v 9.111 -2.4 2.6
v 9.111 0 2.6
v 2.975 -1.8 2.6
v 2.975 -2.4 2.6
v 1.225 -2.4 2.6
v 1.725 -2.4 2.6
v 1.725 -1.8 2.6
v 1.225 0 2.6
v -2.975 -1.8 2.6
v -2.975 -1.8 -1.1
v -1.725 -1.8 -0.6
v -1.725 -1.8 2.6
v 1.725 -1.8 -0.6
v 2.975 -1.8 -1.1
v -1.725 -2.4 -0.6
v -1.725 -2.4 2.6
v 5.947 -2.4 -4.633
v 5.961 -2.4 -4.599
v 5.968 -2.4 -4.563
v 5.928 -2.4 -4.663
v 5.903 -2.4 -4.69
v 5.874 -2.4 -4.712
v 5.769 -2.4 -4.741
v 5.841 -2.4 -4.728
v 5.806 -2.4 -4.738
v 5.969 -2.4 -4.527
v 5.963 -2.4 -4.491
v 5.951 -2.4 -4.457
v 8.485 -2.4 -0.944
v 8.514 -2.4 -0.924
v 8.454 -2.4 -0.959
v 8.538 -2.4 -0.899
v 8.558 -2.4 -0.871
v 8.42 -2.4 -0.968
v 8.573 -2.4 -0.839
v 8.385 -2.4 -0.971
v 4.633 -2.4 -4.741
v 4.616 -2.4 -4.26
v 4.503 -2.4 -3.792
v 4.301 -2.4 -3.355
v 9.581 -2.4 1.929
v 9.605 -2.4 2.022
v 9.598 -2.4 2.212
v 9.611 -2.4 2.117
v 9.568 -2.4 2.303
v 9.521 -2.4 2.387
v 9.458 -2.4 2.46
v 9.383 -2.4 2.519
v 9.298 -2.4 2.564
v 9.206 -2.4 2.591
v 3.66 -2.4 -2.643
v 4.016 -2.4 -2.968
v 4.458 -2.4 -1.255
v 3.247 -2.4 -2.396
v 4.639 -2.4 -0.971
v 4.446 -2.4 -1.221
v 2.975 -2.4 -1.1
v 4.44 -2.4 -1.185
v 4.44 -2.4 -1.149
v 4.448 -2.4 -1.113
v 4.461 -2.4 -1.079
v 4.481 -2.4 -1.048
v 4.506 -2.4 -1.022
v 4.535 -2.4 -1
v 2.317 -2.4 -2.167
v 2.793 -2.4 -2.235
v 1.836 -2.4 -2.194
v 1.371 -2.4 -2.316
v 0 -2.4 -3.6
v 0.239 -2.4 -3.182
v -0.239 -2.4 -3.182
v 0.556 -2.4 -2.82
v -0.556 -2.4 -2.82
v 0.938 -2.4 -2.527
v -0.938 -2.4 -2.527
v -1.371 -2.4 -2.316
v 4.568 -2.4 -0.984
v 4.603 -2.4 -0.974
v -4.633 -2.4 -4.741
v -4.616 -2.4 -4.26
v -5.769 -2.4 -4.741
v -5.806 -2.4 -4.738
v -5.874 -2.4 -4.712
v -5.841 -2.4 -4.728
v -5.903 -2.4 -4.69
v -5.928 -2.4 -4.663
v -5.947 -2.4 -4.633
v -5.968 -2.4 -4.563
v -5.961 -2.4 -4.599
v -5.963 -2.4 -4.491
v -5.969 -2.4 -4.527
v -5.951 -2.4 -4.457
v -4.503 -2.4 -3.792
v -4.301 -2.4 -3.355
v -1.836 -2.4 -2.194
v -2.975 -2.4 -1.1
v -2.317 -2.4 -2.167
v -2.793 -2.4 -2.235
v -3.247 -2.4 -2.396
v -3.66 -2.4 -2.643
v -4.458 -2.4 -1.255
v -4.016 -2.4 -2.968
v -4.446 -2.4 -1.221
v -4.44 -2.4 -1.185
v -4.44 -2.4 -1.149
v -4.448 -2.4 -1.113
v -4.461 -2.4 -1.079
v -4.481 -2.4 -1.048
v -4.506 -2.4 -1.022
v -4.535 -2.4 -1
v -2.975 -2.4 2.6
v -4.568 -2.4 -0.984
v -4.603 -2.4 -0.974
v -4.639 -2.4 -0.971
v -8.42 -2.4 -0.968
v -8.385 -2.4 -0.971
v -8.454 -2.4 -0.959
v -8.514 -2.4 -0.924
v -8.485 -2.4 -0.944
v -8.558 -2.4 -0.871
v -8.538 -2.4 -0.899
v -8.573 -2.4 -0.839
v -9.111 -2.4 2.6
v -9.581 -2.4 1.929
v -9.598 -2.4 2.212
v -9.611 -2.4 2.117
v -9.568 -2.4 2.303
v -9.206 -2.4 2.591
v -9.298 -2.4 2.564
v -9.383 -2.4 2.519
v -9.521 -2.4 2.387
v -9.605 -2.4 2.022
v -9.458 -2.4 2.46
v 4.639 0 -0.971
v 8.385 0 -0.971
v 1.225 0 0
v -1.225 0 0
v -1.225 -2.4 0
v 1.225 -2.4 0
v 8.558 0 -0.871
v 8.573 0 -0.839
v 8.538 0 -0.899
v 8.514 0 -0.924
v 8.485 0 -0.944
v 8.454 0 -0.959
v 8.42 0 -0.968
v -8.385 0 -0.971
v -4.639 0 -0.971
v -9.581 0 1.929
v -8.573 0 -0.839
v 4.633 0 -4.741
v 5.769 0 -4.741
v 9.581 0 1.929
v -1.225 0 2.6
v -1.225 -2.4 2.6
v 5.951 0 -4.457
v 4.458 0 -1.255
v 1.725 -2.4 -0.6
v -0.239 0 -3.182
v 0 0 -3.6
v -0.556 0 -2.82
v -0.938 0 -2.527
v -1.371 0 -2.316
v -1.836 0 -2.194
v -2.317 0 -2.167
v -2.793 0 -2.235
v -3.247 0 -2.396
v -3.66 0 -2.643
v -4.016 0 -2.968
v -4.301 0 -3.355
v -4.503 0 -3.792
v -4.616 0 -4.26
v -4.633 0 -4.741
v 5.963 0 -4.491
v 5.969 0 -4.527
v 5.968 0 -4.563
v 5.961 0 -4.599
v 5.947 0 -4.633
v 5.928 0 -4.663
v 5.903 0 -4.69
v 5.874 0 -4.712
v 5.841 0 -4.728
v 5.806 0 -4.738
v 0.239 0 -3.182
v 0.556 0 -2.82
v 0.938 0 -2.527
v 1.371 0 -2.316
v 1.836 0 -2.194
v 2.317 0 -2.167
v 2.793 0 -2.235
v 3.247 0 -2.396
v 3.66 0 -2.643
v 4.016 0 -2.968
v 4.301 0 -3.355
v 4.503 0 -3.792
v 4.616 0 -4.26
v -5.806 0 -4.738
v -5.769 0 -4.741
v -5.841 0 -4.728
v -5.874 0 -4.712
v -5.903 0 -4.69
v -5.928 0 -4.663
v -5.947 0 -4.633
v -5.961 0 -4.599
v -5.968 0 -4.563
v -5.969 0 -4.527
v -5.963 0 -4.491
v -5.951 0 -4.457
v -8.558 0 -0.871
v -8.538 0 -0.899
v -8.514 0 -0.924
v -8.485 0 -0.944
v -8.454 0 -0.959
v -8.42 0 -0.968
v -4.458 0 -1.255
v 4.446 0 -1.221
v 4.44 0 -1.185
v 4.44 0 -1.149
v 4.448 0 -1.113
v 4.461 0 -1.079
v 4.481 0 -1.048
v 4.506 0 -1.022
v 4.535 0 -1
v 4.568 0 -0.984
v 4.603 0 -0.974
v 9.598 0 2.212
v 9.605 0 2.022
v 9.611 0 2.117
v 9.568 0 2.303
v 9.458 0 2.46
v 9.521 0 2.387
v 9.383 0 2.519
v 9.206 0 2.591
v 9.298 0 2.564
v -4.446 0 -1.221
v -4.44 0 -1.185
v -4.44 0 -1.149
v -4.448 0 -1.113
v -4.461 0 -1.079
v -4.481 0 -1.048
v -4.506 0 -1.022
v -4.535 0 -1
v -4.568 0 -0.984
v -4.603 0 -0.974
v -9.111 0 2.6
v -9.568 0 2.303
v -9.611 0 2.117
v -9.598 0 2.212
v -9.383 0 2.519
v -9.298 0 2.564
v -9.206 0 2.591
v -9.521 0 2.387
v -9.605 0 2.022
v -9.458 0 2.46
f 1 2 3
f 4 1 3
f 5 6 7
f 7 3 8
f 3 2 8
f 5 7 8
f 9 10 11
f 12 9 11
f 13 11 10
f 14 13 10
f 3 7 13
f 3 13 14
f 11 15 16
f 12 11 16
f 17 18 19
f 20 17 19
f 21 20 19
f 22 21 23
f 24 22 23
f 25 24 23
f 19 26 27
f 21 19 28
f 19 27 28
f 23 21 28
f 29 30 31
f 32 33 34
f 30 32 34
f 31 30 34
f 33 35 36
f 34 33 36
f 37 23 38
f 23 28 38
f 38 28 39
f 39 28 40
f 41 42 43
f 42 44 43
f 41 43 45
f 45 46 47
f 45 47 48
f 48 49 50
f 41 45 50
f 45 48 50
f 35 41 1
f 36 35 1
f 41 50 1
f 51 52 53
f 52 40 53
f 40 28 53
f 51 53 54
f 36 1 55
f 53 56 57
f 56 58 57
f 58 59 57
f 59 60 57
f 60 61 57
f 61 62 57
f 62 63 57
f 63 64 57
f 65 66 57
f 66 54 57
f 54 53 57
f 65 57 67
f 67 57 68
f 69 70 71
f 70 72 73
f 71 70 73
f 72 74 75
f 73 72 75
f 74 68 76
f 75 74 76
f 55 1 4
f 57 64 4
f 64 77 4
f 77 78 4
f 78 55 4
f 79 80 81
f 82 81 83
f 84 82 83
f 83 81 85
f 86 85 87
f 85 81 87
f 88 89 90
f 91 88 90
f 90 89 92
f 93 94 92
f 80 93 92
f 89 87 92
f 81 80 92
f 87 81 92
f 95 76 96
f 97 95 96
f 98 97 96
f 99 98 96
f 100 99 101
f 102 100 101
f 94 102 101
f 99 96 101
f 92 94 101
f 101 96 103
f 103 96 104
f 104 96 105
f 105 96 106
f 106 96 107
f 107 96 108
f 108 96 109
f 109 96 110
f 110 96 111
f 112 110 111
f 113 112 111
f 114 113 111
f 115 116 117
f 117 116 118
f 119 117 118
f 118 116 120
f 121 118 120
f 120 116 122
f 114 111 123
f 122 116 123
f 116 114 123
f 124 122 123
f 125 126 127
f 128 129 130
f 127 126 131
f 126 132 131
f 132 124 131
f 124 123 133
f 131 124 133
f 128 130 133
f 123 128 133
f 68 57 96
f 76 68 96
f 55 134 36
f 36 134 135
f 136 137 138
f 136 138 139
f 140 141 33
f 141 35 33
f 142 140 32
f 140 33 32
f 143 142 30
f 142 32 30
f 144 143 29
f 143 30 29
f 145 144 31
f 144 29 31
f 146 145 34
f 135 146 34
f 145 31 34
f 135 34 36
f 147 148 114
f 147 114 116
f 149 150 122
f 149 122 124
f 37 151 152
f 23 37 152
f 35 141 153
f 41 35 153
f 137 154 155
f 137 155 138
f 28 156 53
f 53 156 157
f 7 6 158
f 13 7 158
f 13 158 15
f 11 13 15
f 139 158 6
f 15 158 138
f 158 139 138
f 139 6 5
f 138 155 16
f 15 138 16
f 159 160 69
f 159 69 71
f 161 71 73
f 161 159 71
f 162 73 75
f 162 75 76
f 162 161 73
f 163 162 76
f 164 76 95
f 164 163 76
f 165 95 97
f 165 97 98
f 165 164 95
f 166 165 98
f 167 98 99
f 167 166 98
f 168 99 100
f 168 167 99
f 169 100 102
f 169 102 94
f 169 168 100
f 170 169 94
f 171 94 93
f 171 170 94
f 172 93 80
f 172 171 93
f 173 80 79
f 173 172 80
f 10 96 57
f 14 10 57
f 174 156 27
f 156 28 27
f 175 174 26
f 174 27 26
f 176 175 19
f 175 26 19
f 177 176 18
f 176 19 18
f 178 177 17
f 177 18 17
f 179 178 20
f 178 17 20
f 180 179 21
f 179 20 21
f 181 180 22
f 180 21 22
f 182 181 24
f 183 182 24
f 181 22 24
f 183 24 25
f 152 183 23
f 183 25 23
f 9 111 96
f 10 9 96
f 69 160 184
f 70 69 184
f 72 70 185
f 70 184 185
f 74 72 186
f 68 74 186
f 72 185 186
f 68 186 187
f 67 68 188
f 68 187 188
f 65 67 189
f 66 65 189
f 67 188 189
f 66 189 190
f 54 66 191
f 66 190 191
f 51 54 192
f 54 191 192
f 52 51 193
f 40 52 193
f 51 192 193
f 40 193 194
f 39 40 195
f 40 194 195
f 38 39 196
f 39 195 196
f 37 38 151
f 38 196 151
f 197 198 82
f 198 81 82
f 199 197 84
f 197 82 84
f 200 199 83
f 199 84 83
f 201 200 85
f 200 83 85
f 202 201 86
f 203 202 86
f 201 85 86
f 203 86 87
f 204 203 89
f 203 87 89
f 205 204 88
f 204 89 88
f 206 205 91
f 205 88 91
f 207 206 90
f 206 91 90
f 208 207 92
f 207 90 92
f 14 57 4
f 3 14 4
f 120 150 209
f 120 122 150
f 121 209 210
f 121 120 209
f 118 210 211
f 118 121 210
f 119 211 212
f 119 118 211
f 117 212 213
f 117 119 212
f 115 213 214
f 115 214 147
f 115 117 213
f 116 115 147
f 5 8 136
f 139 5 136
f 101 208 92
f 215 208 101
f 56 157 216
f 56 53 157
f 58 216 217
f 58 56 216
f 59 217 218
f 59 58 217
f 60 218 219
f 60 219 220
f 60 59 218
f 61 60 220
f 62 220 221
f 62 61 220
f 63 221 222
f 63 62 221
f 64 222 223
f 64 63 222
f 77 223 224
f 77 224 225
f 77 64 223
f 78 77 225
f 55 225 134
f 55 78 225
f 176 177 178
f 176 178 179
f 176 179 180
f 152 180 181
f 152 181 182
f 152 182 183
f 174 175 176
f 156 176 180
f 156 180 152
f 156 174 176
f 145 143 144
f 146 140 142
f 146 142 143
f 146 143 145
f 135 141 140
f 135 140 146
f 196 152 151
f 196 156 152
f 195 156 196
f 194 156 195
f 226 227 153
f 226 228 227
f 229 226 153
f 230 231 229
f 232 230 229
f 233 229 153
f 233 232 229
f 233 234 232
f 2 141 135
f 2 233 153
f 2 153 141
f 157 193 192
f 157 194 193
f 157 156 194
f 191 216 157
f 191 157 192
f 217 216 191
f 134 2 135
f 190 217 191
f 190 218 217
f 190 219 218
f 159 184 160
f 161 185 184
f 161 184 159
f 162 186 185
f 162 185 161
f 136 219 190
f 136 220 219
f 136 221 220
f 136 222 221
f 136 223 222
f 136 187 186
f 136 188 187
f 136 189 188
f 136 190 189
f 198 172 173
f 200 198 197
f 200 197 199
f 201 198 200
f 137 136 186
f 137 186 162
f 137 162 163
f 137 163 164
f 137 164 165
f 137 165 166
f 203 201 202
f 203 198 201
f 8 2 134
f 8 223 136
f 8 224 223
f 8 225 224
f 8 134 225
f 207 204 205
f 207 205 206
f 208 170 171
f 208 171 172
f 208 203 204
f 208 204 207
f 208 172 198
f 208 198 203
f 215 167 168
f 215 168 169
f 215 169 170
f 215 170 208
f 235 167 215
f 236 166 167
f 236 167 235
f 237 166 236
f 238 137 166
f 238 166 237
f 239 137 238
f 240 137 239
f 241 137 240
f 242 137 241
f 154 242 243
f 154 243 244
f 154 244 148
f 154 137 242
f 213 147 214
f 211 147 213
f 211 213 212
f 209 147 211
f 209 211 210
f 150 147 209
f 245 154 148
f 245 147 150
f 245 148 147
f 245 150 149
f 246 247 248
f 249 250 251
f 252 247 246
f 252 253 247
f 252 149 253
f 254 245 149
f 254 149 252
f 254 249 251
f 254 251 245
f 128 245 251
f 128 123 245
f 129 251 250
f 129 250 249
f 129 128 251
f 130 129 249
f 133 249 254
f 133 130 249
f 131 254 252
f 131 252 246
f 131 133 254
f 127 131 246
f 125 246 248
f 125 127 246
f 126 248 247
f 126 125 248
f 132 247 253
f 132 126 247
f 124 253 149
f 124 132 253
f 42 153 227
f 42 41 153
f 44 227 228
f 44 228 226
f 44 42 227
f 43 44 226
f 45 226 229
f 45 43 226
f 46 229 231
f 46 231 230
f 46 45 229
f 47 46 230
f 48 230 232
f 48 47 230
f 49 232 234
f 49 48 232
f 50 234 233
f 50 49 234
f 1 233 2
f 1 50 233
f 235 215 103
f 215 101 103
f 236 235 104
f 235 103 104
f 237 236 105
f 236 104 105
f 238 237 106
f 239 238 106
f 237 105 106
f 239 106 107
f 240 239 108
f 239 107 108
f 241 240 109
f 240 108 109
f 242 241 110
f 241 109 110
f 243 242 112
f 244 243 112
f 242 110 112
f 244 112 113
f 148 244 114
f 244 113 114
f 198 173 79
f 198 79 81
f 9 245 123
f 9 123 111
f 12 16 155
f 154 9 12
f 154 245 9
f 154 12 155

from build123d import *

# Parameters (mm, degrees)
F1_DEPTH = 2.4
F3_R     = 0.5
F4_R     = 0.2
F5_R     = 0.2
F6_R     = 0.2
F8_DEPTH = 0.6


with BuildPart() as f1:
    # F0 (on Front) → F1 (new body)
    with BuildSketch(Plane.XZ):
        with BuildLine():
            Line((1.225, 0), (0, 0))
            Line((0, 0), (0, -3.6))
            ThreePointArc((0, -3.6), (2.79331856, -2.235219763), (4.6334154242, -4.7410723531))
            Line((4.6334154242, -4.7410723531), (6.0834154242, -4.7410723531))
            Line((6.0834154242, -4.7410723531), (4.3253234554, -0.970831959))
            Line((4.3253234554, -0.970831959), (8.5253234554, -0.970831959))
            Line((8.5253234554, -0.970831959), (9.825, 2.6))
            Line((9.825, 2.6), (1.225, 2.6))
            Line((1.225, 2.6), (1.225, 0))
        make_face()
    extrude(amount=F1_DEPTH)

    # F2: F1 across face


with BuildPart() as f1_1:
    add(f1.part)
    add(f1.part.mirror(Plane(origin=(0, -1.2, -1.8), x_dir=(0, -1, 0), z_dir=(-1, 0, 0))))

    # F3
    f3_edges = [f1_1.edges().sort_by_distance(p)[0] for p in [
        (-9.825, -1.2, 2.6),
        (9.825, -1.2, 2.6),
    ]]
    fillet(f3_edges, radius=F3_R)

    # F4
    f4_edges = [f1_1.edges().sort_by_distance(p)[0] for p in [
        (-8.525323, -1.2, -0.970832),
        (8.525323, -1.2, -0.970832),
    ]]
    fillet(f4_edges, radius=F4_R)

    # F5
    f5_edges = [f1_1.edges().sort_by_distance(p)[0] for p in [
        (-6.083415, -1.2, -4.741072),
        (6.083415, -1.2, -4.741072),
    ]]
    fillet(f5_edges, radius=F5_R)

    # F6
    f6_edges = [f1_1.edges().sort_by_distance(p)[0] for p in [
        (-4.325323, -1.2, -0.970832),
        (4.325323, -1.2, -0.970832),
    ]]
    fillet(f6_edges, radius=F6_R)

    # F7 (on face) → F8 (cut)
    with BuildSketch(Plane.XZ.offset(2.4)):
        Polygon((1.725, -0.6), (-1.725, -0.6), (-1.725, 2.6), (-2.975, 2.6), (-2.975, -1.1), (2.975, -1.1), (2.975, 2.6), (1.725, 2.6), align=None)
    extrude(amount=-F8_DEPTH, mode=Mode.SUBTRACT)


solid = f1_1.part
